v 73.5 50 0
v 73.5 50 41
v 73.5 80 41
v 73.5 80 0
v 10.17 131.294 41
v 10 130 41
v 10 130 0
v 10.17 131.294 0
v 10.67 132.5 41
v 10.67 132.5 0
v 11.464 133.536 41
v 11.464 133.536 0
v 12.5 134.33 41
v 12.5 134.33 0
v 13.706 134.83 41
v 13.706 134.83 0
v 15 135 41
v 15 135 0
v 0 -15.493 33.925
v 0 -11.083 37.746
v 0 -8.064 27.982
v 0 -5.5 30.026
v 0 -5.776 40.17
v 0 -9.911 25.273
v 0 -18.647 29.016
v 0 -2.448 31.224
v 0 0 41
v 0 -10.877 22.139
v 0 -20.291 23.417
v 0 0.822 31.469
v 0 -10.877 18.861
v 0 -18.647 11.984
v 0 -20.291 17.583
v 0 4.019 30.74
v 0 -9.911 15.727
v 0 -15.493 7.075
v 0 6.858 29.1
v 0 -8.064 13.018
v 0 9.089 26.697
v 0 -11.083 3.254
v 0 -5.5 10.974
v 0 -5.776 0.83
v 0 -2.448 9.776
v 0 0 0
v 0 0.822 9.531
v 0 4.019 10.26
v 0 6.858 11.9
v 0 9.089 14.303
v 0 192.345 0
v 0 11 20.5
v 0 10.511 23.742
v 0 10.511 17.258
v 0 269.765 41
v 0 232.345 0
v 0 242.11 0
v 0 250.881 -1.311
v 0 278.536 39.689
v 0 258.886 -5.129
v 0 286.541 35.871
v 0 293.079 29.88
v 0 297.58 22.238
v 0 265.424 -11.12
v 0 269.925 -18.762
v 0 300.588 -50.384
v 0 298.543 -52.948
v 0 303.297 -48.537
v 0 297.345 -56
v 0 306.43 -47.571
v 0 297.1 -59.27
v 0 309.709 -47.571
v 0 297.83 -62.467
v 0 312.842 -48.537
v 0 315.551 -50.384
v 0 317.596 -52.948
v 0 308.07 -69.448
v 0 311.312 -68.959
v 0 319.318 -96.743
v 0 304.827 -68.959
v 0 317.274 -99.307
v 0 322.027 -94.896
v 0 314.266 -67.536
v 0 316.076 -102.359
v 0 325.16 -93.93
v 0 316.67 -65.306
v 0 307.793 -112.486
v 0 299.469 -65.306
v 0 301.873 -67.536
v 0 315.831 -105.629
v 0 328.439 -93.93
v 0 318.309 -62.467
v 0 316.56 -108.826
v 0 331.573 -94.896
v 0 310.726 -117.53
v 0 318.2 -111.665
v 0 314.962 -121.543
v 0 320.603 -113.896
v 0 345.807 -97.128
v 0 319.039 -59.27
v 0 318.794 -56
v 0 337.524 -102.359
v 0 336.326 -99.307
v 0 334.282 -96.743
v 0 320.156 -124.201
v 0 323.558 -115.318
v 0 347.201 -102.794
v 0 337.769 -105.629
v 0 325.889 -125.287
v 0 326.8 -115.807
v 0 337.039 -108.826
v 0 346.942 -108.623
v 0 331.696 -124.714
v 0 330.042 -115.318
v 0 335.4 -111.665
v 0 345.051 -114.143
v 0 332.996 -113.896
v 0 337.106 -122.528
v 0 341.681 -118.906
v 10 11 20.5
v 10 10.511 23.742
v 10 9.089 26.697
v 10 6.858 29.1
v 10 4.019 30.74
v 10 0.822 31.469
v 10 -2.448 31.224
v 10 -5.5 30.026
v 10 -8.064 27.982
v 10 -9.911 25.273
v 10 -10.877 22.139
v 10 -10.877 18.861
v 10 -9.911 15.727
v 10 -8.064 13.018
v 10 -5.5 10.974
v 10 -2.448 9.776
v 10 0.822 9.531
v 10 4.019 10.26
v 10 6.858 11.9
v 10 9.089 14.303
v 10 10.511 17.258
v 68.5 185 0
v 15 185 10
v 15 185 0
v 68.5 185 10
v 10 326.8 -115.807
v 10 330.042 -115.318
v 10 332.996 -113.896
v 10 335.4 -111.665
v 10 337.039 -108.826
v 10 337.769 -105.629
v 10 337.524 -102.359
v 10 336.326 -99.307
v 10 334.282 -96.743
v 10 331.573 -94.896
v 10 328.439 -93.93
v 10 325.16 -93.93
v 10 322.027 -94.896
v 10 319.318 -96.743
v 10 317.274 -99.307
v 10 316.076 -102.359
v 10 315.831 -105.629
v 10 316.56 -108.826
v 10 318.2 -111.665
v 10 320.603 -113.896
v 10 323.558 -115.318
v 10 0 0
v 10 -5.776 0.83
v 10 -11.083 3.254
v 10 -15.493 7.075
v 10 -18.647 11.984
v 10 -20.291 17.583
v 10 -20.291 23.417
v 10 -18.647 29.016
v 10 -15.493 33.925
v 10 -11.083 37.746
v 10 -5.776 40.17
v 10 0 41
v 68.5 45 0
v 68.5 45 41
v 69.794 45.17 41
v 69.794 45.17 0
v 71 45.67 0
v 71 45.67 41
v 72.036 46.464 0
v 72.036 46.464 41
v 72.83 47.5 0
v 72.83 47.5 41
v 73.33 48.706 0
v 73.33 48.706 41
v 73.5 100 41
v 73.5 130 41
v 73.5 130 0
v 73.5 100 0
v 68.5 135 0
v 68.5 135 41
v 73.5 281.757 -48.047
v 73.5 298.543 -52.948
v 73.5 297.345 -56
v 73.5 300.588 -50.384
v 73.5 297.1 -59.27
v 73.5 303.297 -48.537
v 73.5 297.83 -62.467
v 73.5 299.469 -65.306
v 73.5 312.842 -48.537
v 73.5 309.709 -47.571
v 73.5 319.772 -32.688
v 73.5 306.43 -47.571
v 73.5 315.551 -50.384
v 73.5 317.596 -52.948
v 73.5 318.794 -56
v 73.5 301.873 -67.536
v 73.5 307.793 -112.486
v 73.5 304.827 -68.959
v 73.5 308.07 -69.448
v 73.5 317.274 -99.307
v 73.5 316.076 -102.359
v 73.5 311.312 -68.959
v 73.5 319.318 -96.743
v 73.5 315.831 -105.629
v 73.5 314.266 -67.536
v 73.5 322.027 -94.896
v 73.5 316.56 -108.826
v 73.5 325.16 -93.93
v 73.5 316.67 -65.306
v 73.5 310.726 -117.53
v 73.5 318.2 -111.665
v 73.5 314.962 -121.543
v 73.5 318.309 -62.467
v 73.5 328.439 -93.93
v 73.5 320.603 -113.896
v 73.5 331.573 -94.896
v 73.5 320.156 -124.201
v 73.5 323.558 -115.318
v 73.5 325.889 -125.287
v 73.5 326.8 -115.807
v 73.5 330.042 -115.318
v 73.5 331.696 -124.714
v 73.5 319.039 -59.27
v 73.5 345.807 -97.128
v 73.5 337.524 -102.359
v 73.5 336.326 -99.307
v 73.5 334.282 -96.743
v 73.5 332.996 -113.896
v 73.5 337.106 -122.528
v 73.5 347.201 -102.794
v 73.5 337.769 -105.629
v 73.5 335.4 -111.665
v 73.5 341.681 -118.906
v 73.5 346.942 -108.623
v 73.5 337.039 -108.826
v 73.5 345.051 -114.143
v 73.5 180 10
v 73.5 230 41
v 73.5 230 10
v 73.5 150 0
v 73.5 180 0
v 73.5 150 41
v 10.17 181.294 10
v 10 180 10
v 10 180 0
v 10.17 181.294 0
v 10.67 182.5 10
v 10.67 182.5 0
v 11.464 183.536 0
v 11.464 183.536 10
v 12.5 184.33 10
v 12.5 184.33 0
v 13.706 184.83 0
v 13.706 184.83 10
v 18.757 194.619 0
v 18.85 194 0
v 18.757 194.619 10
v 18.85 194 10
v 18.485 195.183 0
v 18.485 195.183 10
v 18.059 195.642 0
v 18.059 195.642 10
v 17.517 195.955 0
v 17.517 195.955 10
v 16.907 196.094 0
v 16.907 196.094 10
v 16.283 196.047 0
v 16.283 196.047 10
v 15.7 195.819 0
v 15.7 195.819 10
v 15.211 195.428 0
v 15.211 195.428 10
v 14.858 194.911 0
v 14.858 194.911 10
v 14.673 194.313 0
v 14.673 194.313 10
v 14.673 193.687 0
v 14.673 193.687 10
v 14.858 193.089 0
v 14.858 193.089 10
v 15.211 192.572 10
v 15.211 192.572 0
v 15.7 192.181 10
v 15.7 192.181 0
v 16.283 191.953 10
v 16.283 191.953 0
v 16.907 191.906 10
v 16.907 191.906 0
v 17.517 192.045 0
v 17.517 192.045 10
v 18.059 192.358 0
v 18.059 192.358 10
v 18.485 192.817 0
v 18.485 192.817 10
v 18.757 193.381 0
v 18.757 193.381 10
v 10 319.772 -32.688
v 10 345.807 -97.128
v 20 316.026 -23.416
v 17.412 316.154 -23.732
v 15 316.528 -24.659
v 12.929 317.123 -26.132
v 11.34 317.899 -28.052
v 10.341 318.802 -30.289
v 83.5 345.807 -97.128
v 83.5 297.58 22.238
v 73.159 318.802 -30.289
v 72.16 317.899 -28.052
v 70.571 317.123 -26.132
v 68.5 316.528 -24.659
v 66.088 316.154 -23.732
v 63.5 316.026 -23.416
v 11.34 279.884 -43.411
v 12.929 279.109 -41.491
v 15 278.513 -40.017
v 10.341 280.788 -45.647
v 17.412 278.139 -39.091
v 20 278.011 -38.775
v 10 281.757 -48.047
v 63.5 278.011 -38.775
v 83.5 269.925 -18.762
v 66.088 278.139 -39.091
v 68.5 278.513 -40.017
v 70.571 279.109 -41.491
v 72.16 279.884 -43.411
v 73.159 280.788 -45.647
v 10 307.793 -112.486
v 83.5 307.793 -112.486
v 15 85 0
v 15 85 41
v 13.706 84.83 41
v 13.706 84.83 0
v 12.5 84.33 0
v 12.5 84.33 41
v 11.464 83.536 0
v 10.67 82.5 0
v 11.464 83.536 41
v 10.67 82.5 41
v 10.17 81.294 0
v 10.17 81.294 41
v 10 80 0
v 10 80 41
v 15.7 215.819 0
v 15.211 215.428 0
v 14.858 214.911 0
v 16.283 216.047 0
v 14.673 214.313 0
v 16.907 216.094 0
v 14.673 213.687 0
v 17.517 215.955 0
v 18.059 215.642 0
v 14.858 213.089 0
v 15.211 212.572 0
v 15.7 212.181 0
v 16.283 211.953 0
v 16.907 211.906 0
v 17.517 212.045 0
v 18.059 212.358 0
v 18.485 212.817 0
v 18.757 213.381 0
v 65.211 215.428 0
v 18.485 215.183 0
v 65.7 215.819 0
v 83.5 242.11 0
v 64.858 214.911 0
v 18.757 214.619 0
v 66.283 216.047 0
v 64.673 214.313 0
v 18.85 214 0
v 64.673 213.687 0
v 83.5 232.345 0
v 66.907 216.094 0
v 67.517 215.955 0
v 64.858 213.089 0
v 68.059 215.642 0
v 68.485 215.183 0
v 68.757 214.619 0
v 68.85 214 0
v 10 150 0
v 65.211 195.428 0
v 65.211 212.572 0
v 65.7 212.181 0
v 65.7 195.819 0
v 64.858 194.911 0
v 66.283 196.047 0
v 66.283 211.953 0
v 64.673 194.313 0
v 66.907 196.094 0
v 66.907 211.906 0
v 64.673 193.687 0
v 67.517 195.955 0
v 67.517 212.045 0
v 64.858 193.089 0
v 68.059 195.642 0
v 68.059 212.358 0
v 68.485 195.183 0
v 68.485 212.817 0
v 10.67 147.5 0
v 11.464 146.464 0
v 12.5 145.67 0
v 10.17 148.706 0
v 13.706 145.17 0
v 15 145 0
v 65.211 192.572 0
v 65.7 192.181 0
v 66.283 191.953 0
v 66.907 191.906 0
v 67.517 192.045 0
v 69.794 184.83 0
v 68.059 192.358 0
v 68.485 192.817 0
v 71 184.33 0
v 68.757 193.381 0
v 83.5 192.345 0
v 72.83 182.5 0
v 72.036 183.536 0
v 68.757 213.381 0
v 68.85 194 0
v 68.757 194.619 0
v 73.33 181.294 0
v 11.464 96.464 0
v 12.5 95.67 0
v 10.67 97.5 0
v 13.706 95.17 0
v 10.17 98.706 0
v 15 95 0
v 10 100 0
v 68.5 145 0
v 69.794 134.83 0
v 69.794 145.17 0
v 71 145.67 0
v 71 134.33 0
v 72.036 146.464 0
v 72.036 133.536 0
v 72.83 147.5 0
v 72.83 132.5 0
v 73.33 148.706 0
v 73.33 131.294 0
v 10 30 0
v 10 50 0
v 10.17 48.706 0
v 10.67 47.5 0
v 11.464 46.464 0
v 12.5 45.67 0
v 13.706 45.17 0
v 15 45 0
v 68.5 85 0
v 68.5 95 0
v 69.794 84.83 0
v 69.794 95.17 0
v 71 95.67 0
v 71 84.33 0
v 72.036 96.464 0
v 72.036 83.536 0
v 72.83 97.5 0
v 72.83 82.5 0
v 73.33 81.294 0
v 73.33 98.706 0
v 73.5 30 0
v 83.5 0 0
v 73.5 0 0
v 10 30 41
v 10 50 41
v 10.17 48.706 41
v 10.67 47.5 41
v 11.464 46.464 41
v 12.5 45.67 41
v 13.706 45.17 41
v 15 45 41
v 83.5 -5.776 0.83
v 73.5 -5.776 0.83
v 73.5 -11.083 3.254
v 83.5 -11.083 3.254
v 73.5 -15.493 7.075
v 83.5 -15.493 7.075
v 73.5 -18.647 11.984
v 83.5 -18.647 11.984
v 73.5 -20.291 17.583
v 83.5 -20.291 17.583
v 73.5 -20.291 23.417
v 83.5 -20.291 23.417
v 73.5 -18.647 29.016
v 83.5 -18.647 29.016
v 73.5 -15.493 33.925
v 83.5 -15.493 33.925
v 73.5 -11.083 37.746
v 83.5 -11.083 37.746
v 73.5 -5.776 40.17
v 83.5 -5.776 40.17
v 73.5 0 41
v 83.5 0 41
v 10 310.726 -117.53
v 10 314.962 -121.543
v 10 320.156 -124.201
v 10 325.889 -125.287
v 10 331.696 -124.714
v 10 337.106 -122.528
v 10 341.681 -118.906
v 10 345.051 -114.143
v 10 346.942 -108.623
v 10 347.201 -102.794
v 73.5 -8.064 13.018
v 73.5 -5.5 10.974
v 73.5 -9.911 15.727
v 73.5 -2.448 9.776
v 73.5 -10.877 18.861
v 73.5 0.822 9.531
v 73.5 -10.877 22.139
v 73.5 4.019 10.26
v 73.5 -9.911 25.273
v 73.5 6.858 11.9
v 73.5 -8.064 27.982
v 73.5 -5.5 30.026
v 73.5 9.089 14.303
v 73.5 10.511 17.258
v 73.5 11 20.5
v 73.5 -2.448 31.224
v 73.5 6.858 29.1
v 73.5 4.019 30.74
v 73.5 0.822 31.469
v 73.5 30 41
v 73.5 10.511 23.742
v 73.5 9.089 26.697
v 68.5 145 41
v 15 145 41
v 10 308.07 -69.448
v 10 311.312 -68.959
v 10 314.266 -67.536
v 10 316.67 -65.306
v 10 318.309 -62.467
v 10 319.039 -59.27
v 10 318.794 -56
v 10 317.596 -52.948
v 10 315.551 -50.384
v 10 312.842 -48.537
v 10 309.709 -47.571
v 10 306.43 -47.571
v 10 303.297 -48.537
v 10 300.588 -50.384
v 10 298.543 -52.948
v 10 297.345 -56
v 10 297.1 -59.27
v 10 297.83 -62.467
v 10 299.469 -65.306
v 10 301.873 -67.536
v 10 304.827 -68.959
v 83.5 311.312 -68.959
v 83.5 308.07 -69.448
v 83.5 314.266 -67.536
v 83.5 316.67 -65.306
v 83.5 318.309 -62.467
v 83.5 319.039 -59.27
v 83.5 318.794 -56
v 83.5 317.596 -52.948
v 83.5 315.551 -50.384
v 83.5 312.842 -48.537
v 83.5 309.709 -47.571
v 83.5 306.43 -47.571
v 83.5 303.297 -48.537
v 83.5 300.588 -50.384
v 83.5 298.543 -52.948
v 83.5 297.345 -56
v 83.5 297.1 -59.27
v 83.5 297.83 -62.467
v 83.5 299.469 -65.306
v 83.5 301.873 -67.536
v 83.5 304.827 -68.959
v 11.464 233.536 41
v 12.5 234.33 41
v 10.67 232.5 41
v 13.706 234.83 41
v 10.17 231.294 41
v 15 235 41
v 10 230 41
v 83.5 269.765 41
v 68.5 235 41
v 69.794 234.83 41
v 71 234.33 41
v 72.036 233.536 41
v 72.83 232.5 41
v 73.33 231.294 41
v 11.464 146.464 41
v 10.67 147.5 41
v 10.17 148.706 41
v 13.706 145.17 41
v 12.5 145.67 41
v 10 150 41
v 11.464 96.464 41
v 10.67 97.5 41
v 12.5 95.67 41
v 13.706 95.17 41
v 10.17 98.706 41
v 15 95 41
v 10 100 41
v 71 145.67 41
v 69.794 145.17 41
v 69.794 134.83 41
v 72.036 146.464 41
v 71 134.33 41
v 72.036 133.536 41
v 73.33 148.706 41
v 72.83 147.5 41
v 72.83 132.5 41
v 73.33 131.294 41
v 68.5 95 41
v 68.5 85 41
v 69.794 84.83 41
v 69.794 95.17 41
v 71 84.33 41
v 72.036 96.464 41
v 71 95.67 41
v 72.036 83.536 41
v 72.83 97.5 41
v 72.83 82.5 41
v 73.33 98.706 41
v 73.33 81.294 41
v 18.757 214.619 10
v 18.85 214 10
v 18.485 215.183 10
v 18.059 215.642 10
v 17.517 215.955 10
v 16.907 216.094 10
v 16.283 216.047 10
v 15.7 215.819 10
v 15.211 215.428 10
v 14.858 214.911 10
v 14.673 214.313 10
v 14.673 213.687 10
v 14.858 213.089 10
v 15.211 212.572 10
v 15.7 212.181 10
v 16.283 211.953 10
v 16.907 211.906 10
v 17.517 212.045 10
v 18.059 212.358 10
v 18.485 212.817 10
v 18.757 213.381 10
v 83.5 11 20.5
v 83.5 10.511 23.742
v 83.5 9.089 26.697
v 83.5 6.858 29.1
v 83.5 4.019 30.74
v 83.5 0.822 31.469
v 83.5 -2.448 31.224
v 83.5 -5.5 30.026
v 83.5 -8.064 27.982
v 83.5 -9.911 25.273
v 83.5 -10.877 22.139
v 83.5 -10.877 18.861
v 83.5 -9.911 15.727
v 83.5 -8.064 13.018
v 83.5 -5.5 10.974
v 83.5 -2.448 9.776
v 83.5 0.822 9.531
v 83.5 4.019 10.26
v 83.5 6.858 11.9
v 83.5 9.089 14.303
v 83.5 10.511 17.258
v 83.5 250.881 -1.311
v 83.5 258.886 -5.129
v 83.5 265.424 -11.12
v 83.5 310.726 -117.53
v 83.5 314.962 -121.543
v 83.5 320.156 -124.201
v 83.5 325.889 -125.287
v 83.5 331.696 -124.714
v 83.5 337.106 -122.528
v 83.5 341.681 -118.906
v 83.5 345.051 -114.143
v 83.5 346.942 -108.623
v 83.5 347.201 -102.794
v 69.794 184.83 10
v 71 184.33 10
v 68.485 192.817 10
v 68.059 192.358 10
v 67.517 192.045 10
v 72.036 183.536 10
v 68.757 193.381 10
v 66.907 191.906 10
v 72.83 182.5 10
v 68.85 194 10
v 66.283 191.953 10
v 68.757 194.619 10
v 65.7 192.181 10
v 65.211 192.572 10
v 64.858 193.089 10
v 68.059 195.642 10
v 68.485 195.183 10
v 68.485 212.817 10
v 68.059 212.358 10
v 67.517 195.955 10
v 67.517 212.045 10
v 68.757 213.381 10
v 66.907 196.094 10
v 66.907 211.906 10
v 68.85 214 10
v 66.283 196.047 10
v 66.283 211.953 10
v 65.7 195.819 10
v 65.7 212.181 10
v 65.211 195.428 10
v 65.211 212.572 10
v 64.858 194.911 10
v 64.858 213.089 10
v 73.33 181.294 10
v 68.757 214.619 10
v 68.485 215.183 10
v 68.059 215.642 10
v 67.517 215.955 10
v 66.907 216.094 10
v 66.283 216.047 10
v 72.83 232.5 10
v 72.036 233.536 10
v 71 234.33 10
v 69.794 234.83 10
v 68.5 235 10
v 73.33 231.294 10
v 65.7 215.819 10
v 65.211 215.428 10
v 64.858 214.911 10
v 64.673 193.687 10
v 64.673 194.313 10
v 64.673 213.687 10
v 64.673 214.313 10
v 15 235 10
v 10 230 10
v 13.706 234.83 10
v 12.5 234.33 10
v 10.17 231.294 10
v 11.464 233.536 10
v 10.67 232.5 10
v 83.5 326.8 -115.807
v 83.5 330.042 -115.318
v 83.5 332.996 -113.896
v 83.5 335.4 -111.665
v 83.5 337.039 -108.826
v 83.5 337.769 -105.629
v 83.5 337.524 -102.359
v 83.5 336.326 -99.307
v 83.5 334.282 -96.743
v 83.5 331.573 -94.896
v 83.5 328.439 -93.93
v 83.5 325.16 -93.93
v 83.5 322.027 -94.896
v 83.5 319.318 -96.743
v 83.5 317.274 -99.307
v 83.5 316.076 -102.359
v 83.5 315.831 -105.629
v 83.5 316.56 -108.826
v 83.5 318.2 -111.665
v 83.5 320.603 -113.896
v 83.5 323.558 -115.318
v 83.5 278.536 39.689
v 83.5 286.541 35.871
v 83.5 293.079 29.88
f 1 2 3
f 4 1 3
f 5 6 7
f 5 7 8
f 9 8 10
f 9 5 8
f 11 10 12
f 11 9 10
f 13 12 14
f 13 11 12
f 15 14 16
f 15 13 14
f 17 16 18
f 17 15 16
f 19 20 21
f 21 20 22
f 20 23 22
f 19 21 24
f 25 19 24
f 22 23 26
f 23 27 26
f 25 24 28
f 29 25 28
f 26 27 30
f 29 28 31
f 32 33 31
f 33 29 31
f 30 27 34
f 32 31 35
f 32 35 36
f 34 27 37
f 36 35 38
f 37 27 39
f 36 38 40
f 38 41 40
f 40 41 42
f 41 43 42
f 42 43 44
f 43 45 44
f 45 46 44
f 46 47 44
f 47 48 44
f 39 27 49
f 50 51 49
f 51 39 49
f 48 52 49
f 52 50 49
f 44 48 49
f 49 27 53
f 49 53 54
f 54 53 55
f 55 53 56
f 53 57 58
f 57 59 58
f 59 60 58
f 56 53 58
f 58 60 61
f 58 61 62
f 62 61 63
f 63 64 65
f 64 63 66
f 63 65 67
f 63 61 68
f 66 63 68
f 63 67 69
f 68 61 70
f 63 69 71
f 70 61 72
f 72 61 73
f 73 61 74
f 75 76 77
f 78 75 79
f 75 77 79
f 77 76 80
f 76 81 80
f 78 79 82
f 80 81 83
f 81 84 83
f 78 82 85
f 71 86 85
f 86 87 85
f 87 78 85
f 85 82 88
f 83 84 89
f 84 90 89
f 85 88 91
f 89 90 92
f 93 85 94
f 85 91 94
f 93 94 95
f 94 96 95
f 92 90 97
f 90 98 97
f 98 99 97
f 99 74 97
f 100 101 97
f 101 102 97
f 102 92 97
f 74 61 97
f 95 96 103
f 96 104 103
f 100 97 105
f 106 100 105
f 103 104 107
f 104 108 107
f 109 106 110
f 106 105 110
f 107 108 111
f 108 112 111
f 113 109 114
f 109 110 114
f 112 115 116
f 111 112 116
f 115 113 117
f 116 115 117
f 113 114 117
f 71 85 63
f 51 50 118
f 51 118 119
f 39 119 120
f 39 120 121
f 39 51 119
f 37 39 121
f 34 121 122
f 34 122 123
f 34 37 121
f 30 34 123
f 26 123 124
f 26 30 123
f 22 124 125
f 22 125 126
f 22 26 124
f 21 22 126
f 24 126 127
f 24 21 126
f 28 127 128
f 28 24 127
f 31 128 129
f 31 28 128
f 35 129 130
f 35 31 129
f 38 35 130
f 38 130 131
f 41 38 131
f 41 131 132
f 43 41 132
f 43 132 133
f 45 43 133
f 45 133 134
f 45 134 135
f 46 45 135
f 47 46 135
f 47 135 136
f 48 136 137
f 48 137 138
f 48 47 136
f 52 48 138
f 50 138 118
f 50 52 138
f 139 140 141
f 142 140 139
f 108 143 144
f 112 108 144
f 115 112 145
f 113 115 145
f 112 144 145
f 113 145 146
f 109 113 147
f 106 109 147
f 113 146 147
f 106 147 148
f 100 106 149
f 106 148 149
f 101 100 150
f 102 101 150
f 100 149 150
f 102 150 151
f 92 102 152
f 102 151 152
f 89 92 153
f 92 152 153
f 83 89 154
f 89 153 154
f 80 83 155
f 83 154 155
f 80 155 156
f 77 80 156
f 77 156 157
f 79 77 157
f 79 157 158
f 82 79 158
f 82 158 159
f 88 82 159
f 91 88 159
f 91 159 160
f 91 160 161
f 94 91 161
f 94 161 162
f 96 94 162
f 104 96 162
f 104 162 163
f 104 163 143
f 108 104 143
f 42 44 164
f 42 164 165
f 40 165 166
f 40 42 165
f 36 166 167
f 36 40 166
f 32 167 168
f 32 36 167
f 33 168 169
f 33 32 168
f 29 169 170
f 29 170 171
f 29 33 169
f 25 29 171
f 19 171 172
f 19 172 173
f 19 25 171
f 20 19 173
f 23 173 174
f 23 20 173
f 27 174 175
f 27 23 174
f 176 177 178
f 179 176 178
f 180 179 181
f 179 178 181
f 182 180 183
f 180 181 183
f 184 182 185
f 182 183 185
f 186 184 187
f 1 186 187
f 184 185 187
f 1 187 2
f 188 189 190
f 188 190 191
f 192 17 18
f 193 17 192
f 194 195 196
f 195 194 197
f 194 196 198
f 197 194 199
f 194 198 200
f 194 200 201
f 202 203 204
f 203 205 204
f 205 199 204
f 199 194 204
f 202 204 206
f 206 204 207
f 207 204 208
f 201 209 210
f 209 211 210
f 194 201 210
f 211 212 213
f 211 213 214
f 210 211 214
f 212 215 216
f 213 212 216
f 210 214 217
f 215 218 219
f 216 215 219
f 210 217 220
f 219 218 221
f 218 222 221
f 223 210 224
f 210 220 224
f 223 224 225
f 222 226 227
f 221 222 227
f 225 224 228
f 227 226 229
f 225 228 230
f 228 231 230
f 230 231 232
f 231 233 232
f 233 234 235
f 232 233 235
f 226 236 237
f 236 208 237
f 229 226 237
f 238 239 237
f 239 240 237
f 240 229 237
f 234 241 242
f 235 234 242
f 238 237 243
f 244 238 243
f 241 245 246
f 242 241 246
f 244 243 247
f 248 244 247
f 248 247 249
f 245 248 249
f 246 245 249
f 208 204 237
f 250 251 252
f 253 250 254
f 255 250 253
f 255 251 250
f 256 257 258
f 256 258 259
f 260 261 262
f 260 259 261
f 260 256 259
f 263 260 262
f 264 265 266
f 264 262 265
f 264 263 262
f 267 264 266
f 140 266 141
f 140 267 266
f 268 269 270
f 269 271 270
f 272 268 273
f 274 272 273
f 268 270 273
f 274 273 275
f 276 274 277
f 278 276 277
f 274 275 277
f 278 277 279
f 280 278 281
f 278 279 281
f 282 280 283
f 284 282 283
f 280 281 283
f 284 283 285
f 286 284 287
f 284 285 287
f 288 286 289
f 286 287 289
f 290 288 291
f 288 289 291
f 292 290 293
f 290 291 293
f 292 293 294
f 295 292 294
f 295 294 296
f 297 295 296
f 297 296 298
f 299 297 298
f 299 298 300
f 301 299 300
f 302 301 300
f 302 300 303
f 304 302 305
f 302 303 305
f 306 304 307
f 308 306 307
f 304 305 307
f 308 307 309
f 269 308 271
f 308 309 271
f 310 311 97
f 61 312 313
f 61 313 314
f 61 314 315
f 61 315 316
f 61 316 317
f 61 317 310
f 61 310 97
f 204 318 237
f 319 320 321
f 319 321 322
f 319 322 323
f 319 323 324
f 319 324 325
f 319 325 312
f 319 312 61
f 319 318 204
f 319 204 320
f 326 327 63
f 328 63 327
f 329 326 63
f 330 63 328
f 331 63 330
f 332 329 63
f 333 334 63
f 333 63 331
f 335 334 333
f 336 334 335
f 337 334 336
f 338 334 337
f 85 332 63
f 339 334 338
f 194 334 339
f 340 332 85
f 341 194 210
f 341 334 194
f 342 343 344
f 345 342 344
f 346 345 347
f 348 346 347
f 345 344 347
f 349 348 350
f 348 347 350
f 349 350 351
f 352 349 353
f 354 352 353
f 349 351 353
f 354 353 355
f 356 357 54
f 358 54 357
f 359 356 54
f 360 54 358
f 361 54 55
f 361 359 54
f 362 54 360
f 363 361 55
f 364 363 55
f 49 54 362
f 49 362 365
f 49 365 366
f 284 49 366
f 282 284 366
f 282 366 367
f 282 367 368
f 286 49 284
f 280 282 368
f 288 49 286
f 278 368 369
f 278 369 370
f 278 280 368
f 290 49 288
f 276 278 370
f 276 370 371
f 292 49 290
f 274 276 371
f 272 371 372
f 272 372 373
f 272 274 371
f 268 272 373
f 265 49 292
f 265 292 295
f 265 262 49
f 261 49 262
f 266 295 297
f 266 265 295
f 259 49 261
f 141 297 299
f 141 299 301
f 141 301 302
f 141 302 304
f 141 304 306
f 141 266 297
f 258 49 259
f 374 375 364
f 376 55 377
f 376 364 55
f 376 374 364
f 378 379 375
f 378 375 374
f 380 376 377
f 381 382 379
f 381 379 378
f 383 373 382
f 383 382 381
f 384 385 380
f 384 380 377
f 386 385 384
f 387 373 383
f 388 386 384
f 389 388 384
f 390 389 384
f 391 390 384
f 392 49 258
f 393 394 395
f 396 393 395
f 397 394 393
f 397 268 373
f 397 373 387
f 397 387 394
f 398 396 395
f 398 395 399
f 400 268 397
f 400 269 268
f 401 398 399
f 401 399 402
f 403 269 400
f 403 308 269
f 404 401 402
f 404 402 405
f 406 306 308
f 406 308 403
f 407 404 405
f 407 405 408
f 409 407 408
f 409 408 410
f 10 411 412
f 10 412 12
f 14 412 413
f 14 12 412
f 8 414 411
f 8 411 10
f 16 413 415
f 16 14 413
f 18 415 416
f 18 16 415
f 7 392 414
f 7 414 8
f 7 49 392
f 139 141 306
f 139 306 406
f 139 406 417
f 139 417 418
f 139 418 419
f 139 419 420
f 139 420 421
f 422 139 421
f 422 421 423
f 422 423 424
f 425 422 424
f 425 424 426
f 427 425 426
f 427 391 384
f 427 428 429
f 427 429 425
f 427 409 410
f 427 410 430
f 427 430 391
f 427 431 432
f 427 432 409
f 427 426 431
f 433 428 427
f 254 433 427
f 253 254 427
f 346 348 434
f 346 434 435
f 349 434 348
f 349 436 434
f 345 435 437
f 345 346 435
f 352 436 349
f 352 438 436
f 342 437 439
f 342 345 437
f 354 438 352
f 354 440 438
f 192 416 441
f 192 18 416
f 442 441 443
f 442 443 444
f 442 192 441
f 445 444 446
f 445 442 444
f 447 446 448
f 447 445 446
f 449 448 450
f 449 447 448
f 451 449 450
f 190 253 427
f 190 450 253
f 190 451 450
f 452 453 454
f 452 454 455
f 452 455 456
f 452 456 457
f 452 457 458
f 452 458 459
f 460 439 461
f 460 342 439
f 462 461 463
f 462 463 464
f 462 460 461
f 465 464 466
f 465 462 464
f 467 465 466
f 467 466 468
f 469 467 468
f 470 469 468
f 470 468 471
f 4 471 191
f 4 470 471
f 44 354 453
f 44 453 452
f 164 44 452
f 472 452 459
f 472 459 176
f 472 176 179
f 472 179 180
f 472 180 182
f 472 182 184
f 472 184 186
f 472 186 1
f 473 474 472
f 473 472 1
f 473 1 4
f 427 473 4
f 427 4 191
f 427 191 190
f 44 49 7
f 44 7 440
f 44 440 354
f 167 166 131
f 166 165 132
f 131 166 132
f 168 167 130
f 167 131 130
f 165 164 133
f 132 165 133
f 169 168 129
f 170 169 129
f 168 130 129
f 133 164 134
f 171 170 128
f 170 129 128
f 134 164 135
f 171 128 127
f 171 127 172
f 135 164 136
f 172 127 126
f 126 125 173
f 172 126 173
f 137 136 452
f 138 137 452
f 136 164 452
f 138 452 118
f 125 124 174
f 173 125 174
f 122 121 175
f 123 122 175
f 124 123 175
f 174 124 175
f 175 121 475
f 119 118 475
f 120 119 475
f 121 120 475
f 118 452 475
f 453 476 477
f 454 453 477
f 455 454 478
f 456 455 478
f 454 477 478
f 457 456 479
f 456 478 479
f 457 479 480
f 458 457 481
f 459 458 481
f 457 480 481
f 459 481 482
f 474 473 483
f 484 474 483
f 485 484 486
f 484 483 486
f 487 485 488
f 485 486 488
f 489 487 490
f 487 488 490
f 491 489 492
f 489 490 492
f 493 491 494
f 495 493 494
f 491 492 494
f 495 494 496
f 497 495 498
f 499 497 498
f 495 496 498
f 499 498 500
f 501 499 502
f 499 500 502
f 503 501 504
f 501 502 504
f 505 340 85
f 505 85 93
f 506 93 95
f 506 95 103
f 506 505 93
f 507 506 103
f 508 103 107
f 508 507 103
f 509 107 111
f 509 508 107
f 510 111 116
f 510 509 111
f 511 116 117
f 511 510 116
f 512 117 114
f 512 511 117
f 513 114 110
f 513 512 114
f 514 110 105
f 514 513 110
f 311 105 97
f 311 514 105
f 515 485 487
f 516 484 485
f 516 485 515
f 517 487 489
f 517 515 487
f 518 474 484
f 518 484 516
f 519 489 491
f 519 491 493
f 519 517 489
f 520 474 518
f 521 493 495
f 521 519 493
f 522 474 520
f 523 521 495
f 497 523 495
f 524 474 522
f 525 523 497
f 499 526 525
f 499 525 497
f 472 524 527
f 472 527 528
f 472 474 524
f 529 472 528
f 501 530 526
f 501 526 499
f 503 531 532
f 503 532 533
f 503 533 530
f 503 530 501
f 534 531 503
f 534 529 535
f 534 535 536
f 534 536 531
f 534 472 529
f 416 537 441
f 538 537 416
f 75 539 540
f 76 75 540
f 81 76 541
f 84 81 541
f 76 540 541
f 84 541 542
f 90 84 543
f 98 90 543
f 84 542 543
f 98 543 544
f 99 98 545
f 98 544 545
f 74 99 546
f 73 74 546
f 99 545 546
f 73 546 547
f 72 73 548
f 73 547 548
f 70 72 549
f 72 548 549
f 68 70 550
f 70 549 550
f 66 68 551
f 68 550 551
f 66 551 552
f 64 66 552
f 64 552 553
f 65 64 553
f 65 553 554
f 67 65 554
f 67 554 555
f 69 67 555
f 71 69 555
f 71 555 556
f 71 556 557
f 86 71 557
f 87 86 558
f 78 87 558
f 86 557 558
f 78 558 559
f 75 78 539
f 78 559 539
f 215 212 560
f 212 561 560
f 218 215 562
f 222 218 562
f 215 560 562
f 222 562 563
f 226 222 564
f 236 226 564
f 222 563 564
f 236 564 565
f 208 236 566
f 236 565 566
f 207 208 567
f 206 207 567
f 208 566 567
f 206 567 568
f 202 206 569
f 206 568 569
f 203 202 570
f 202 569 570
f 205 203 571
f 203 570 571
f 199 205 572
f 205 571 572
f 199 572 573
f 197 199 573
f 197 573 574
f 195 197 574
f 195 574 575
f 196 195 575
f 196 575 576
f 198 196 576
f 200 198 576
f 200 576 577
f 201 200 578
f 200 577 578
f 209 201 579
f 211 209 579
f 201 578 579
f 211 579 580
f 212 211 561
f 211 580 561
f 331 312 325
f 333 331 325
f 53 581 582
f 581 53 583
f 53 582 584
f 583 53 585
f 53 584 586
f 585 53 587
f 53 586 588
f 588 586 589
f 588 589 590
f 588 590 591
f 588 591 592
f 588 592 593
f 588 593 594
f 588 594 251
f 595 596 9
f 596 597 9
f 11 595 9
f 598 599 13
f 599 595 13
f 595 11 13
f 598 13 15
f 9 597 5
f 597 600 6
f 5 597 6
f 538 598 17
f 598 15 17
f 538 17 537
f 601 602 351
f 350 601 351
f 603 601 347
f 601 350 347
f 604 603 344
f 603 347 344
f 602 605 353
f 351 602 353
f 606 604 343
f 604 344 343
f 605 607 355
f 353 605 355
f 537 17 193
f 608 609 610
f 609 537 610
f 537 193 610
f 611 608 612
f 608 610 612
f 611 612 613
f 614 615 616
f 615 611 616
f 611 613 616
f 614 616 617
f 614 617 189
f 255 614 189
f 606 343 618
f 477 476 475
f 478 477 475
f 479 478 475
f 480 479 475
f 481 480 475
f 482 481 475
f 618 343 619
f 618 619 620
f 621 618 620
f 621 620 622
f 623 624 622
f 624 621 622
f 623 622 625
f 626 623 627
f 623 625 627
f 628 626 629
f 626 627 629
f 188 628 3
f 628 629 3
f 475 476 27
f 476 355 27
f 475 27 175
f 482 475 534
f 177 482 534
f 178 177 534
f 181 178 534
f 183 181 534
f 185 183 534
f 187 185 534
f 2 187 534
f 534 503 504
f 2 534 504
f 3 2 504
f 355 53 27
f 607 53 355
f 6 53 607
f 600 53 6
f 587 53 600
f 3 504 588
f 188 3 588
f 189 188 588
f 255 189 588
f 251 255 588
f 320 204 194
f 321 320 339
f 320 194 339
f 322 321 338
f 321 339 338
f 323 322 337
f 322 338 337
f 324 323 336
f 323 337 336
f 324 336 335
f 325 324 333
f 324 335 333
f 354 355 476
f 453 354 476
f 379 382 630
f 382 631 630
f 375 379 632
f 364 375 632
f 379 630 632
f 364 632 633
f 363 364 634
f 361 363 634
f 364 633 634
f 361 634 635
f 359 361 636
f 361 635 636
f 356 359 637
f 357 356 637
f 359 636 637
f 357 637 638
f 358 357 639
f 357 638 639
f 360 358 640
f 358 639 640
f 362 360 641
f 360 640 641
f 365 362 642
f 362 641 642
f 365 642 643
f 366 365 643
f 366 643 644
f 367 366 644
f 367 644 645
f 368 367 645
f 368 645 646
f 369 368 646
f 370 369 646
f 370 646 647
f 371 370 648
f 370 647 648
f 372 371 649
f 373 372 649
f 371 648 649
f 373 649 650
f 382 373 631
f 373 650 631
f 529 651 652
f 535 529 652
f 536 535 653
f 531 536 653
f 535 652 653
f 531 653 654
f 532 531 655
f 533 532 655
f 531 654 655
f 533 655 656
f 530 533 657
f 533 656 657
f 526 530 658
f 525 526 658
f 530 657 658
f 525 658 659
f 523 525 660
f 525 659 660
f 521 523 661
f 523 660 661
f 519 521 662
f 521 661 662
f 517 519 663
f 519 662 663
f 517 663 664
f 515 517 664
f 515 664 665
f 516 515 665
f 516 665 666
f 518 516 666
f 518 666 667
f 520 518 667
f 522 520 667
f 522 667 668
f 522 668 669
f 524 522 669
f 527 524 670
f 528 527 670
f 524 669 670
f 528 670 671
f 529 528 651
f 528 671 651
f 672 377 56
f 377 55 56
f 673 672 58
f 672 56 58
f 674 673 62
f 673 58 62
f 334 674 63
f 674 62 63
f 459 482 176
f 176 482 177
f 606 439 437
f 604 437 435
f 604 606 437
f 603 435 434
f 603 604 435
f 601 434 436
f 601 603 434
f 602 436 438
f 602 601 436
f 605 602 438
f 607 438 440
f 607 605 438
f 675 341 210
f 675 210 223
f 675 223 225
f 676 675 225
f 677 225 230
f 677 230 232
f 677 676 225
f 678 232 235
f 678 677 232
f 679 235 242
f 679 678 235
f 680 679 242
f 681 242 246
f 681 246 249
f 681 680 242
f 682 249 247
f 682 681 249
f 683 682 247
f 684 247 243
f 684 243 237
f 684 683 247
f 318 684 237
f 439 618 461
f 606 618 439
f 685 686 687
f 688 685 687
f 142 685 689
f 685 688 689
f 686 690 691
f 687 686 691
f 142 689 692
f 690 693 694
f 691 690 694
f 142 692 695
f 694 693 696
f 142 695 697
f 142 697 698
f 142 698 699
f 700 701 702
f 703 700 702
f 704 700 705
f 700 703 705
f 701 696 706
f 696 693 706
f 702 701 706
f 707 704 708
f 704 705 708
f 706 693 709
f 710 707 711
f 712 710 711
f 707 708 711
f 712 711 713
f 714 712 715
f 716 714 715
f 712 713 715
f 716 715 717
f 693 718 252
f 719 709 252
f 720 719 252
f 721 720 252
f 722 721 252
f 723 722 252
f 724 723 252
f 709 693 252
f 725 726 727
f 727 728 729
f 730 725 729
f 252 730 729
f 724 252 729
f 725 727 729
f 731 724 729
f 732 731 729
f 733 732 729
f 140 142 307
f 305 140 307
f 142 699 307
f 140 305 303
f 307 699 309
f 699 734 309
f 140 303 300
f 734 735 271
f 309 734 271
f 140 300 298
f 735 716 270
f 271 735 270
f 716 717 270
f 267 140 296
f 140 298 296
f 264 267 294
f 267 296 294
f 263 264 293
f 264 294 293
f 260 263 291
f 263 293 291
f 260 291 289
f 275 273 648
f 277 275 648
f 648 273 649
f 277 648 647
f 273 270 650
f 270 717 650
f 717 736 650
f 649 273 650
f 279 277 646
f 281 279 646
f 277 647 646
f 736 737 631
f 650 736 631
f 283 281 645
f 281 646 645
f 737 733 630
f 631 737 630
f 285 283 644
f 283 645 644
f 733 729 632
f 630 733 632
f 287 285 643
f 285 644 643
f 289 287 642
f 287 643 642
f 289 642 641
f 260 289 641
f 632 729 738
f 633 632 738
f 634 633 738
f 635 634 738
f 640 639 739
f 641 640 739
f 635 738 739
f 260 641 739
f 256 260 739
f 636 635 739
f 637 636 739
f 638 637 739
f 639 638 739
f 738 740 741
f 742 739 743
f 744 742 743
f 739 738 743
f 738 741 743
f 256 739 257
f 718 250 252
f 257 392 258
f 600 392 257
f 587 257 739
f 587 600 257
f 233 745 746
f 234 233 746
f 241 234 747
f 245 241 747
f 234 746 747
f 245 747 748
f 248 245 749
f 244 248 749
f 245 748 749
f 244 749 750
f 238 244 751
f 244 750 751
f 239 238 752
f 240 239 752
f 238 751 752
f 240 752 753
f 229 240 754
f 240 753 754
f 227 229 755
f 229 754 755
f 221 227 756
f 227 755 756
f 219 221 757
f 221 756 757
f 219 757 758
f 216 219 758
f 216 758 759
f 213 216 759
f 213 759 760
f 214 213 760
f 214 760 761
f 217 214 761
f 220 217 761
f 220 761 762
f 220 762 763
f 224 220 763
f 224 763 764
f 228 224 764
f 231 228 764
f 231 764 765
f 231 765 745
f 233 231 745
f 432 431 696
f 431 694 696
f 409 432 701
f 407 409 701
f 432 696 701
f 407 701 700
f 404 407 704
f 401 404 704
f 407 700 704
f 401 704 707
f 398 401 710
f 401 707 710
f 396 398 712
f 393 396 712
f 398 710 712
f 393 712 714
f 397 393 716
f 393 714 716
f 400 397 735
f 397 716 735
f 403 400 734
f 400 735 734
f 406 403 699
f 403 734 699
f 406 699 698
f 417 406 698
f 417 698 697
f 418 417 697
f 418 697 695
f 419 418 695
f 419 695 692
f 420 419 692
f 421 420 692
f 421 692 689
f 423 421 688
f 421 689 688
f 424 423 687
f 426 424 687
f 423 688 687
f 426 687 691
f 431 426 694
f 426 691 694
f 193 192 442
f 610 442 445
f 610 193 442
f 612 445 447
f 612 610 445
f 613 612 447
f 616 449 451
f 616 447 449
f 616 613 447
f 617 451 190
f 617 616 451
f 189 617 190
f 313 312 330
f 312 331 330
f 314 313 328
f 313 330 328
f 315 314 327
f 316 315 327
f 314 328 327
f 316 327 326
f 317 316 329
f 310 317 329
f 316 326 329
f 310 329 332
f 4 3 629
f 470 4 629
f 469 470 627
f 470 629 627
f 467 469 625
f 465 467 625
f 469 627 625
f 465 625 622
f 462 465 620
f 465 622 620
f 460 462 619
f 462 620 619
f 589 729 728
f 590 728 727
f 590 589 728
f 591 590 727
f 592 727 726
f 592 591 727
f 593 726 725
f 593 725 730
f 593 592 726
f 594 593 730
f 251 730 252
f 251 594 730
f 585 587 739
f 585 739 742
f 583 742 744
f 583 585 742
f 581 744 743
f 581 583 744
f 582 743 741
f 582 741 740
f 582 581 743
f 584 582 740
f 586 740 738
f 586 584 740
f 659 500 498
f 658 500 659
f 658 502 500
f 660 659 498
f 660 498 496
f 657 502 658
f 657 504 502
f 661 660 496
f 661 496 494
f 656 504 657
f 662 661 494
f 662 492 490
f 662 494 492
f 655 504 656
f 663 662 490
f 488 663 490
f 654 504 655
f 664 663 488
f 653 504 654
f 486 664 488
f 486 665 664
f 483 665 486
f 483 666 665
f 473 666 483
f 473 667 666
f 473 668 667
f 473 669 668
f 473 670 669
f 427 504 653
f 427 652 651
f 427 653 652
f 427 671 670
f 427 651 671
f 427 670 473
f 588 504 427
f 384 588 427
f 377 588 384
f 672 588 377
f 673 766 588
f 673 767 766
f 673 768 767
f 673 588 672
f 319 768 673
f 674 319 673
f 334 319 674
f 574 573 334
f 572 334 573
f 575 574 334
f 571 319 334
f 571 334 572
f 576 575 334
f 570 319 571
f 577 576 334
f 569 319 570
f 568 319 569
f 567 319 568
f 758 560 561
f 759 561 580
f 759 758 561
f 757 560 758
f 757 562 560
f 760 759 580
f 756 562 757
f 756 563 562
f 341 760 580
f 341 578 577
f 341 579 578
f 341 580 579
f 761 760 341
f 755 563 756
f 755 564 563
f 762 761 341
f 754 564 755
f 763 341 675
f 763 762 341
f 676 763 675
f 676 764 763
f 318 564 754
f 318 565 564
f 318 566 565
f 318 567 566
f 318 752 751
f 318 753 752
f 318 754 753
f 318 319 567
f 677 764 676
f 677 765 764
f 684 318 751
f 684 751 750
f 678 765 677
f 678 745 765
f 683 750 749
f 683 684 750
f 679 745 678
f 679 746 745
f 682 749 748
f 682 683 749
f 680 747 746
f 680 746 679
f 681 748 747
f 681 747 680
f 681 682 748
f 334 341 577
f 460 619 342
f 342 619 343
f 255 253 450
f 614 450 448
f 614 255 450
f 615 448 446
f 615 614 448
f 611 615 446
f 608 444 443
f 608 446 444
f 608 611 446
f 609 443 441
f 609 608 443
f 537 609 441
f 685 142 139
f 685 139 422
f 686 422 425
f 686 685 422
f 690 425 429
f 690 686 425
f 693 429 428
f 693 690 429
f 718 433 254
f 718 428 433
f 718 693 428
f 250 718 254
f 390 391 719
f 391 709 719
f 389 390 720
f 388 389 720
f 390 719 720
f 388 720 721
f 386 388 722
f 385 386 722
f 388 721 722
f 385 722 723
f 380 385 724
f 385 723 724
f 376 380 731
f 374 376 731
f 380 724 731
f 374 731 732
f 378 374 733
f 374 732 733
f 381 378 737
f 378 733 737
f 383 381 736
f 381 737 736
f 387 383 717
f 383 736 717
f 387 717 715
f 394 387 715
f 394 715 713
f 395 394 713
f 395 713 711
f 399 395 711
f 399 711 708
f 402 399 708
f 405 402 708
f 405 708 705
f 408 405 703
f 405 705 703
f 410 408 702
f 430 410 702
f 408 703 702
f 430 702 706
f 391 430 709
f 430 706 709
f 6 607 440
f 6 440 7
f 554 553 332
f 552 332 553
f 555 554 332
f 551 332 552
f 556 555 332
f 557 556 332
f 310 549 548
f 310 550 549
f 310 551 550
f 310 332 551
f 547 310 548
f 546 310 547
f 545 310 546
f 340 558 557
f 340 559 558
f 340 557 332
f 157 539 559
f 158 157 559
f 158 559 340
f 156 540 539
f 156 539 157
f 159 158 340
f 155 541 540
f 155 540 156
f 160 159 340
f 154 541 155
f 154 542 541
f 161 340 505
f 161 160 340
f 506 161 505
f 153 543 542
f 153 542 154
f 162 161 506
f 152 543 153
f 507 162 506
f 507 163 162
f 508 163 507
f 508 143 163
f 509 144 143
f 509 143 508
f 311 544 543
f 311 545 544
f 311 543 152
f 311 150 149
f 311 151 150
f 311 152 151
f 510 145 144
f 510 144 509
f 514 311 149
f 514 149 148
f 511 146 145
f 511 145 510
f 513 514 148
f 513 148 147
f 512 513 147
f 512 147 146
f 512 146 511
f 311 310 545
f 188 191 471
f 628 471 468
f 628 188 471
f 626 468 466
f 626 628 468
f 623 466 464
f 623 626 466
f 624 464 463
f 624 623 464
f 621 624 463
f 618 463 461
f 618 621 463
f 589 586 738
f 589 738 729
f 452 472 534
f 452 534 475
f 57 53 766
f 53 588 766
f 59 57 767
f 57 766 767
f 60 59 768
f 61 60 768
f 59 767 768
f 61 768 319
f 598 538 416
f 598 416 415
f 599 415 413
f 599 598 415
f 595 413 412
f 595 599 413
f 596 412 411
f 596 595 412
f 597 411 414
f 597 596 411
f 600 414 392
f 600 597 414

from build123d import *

# Parameters (mm, degrees)
EXTRUDE_1_DEPTH        = 41
EXTRUDE_2_DEPTH        = 10
SKETCH_3_R             = 11
CUT_EXTRUDE_1_DEPTH    = 10
SKETCH_4_W             = 83.5
SKETCH_4_H             = 41
EXTRUDE_3_DEPTH        = 250
CUT_EXTRUDE_2_DEPTH    = 309
EXTRUDE_5_DEPTH        = 83.5
EXTRUDE_6_DEPTH        = 41.75
FILLET_1_R             = 8
SKETCH_10_R            = 5.5
CUT_EXTRUDE_3_DEPTH    = 92
EXTRUDE_9_DEPTH        = 41.75
SKETCH_15_R            = 11
CUT_EXTRUDE_5_DEPTH    = 92.5
SKETCH_16_W            = 63.5
SKETCH_16_H            = 100
CUT_EXTRUDE_6_DEPTH    = 65
FILLET_3_R             = 30
CUT_EXTRUDE_7_DEPTH    = 37.75
SKETCH_19_W            = 70.175183739
SKETCH_19_H            = 41.669127314
CUT_EXTRUDE_8_DEPTH    = 90.5
HOLE_WIZARD_M5_1_D     = 4.2
HOLE_WIZARD_M5_1_DEPTH = 10
HOLE_WIZARD_M5_1_TIP   = 1.2618073
FILLET_5_R             = 10
CUT_EXTRUDE_9_DEPTH    = 31


with BuildPart() as part:
    # 草图1 → 凸台-拉伸1 (new body)
    with BuildSketch(Plane.XY):
        Polygon((0, 0), (0, 40), (83.5, 40), (83.5, 0), (73.5, 0), (73.5, 30), (10, 30), (10, 0), align=None)
    extrude(amount=EXTRUDE_1_DEPTH)

    # 草图2 → 凸台-拉伸2 (add)
    with BuildSketch(Plane(origin=(83.5, 0, 0), x_dir=(0, 0, -1), z_dir=(1, 0, 0))):
        with BuildLine():
            Line((-41, 0), (0, 0))
            ThreePointArc((0, 0), (-20.5, -20.5), (-41, 0))
        make_face()
    extrude_2 = extrude(amount=-EXTRUDE_2_DEPTH)

    # 草图3 → 切除-拉伸1 (cut)
    with BuildSketch(Plane(origin=(83.5, 0, 0), x_dir=(0, 0, -1), z_dir=(1, 0, 0))):
        with Locations(Location((-20.5, 0, 0), (0, 0, 90))):
            Circle(SKETCH_3_R)
    cut_extrude_1 = extrude(amount=-CUT_EXTRUDE_1_DEPTH, mode=Mode.SUBTRACT)

    # 镜向1: 凸台-拉伸2, 切除-拉伸1 across plane
    add(extrude_2.mirror(Plane(origin=(41.75, 0, 0), x_dir=(0, 0, 1), z_dir=(1, 0, 0))))
    add(cut_extrude_1.mirror(Plane(origin=(41.75, 0, 0), x_dir=(0, 0, 1), z_dir=(1, 0, 0))), mode=Mode.SUBTRACT)

    # 草图4 → 凸台-拉伸3 (add)
    with BuildSketch(Plane(origin=(0, 40, 0), x_dir=(1, 0, 0), z_dir=(0, 1, 0))):
        with Locations((41.75, -20.5)):
            Rectangle(SKETCH_4_W, SKETCH_4_H)
    extrude(amount=EXTRUDE_3_DEPTH)

    # 草图5 → 切除-拉伸2 (cut)
    with BuildSketch(Plane.XY.offset(41)):
        with BuildLine():
            Line((15, 45), (68.5, 45))
            ThreePointArc((68.5, 45), (72.035533906, 46.464466094), (73.5, 50))
            Line((73.5, 50), (73.5, 80))
            ThreePointArc((73.5, 80), (72.035533906, 83.535533906), (68.5, 85))
            Line((68.5, 85), (15, 85))
            ThreePointArc((15, 85), (11.464466094, 83.535533906), (10, 80))
            Line((10, 80), (10, 50))
            ThreePointArc((10, 50), (11.464466094, 46.464466094), (15, 45))
        make_face()
        with BuildLine():
            Line((10, 100), (10, 130))
            ThreePointArc((10, 130), (11.464466094, 133.535533906), (15, 135))
            Line((15, 135), (68.5, 135))
            ThreePointArc((68.5, 135), (72.035533906, 133.535533906), (73.5, 130))
            Line((73.5, 130), (73.5, 100))
            ThreePointArc((73.5, 100), (72.035533906, 96.464466094), (68.5, 95))
            Line((68.5, 95), (15, 95))
            ThreePointArc((15, 95), (11.464466094, 96.464466094), (10, 100))
        make_face()
        with BuildLine():
            Line((10, 150), (10, 180))
            ThreePointArc((10, 180), (11.464466094, 183.535533906), (15, 185))
            Line((15, 185), (68.5, 185))
            ThreePointArc((68.5, 185), (72.035533906, 183.535533906), (73.5, 180))
            Line((73.5, 180), (73.5, 150))
            ThreePointArc((73.5, 150), (72.035533906, 146.464466094), (68.5, 145))
            Line((68.5, 145), (15, 145))
            ThreePointArc((15, 145), (11.464466094, 146.464466094), (10, 150))
        make_face()
    extrude(amount=-CUT_EXTRUDE_2_DEPTH, mode=Mode.SUBTRACT)

    # 草图7 → 凸台-拉伸5 (add)
    with BuildSketch(Plane(origin=(83.5, 0, 0), x_dir=(0, 0, -1), z_dir=(1, 0, 0))):
        Polygon((0, 262.345150809), (112.486411563, 307.792611131), (97.127541233, 345.807149168), (-41, 290), align=None)
    extrude(amount=-EXTRUDE_5_DEPTH)

    # 草图8 → 凸台-拉伸6 (add, symmetric)
    with BuildSketch(Plane(origin=(41.75, 0, 0), x_dir=(0, 0, -1), z_dir=(1, 0, 0))):
        Polygon((0, 232.345150809), (0, 192.345150809), (55, 192.345150809), (55, 210.345150809), align=None)
    extrude(amount=EXTRUDE_6_DEPTH, both=True)

    # 圆角1
    fillet_1_edges = [part.edges().sort_by_distance(p)[0] for p in [
        (41.75, 192.345150809, -55),
    ]]
    fillet(fillet_1_edges, radius=FILLET_1_R)

    # 草图10 → 切除-拉伸3 (cut)
    with BuildSketch(Plane(origin=(83.5, 0, 0), x_dir=(0, 0, -1), z_dir=(1, 0, 0))):
        with Locations(Location((47, 200.345150809, 0), (0, 0, 90))):
            Circle(SKETCH_10_R)
    extrude(amount=-CUT_EXTRUDE_3_DEPTH, mode=Mode.SUBTRACT)

    # 草图14 → 凸台-拉伸9 (add, symmetric)
    with BuildSketch(Plane(origin=(41.75, 0, 0), x_dir=(0, 0, -1), z_dir=(1, 0, 0))):
        with BuildLine():
            Line((97.127541233, 345.807149168), (112.486411563, 307.792611131))
            ThreePointArc((112.486411563, 307.792611131), (123.814245417, 334.479315315), (97.127541233, 345.807149168))
        make_face()
    extrude(amount=EXTRUDE_9_DEPTH, both=True)

    # 草图15 → 切除-拉伸5 (cut, symmetric)
    with BuildSketch(Plane(origin=(83.5, 0, 0), x_dir=(0, 0, -1), z_dir=(1, 0, 0))):
        with Locations((104.806976398, 326.79988015)):
            Circle(SKETCH_15_R)
        with Locations((58.44778367, 308.069550479)):
            Circle(SKETCH_15_R)
    extrude(amount=CUT_EXTRUDE_5_DEPTH, both=True, mode=Mode.SUBTRACT)

    # 草图16 → 切除-拉伸6 (cut)
    with BuildSketch(Plane(origin=(0, 263.544767644, 106.47899781), x_dir=(1, 0, 0), z_dir=(0, 0.9271838545667882, 0.37460659341591007))):
        with Locations((41.75, 190.096726194)):
            Rectangle(SKETCH_16_W, SKETCH_16_H)
    extrude(amount=-CUT_EXTRUDE_6_DEPTH, mode=Mode.SUBTRACT)

    # 圆角3
    fillet_3_edges = [part.edges().sort_by_distance(p)[0] for p in [
        (41.75, 262.345150809, 0),
        (41.75, 290, 41),
    ]]
    fillet(fillet_3_edges, radius=FILLET_3_R)

    # 草图8<2> → 切除-拉伸7 (cut, symmetric)
    with BuildSketch(Plane(origin=(41.75, 0, 0), x_dir=(0, 0, -1), z_dir=(1, 0, 0))):
        Polygon((0, 232.345150809), (0, 192.345150809), (55, 192.345150809), (55, 210.345150809), align=None)
    extrude(amount=CUT_EXTRUDE_7_DEPTH, both=True, mode=Mode.SUBTRACT)

    # 草图19 → 切除-拉伸8 (cut)
    with BuildSketch(Plane(origin=(83.5, 0, 0), x_dir=(0, 0, -1), z_dir=(1, 0, 0))):
        with Locations((35.08759187, 211.510587152)):
            Rectangle(SKETCH_19_W, SKETCH_19_H)
    extrude(amount=-CUT_EXTRUDE_8_DEPTH, mode=Mode.SUBTRACT)

    # M5 螺纹孔的螺纹孔钻头1
    with Locations(Plane(origin=(66.75, 214, 0), x_dir=(-1, 0, 0), z_dir=(0, 0, -1))):
        with Locations((0, 0), (50, 0), (50, -20), (0, -20)):
            Hole(HOLE_WIZARD_M5_1_D / 2, depth=HOLE_WIZARD_M5_1_DEPTH)
            with Locations((0, 0, -(HOLE_WIZARD_M5_1_DEPTH + HOLE_WIZARD_M5_1_TIP / 2))):  # 118° drill point
                Cone(0, HOLE_WIZARD_M5_1_D / 2, HOLE_WIZARD_M5_1_TIP, mode=Mode.SUBTRACT)

    # 圆角5
    fillet_5_edges = [part.edges().sort_by_distance(p)[0] for p in [
        (10, 297.018655973, -31.09585996),
        (73.5, 297.018655973, -31.09585996),
    ]]
    fillet(fillet_5_edges, radius=FILLET_5_R)

    # 草图22 → 切除-拉伸9 (cut)
    with BuildSketch(Plane.XY.offset(41)):
        with BuildLine():
            Line((10, 190), (10, 230))
            ThreePointArc((10, 230), (11.464466094, 233.535533906), (15, 235))
            Line((15, 235), (68.5, 235))
            ThreePointArc((68.5, 235), (72.035533906, 233.535533906), (73.5, 230))
            Line((73.5, 230), (73.5, 190))
            Line((73.5, 190), (73.5, 177.902541229))
            Line((73.5, 177.902541229), (10, 177.902541229))
            Line((10, 177.902541229), (10, 190))
        make_face()
    extrude(amount=-CUT_EXTRUDE_9_DEPTH, mode=Mode.SUBTRACT)


solid = part.part
